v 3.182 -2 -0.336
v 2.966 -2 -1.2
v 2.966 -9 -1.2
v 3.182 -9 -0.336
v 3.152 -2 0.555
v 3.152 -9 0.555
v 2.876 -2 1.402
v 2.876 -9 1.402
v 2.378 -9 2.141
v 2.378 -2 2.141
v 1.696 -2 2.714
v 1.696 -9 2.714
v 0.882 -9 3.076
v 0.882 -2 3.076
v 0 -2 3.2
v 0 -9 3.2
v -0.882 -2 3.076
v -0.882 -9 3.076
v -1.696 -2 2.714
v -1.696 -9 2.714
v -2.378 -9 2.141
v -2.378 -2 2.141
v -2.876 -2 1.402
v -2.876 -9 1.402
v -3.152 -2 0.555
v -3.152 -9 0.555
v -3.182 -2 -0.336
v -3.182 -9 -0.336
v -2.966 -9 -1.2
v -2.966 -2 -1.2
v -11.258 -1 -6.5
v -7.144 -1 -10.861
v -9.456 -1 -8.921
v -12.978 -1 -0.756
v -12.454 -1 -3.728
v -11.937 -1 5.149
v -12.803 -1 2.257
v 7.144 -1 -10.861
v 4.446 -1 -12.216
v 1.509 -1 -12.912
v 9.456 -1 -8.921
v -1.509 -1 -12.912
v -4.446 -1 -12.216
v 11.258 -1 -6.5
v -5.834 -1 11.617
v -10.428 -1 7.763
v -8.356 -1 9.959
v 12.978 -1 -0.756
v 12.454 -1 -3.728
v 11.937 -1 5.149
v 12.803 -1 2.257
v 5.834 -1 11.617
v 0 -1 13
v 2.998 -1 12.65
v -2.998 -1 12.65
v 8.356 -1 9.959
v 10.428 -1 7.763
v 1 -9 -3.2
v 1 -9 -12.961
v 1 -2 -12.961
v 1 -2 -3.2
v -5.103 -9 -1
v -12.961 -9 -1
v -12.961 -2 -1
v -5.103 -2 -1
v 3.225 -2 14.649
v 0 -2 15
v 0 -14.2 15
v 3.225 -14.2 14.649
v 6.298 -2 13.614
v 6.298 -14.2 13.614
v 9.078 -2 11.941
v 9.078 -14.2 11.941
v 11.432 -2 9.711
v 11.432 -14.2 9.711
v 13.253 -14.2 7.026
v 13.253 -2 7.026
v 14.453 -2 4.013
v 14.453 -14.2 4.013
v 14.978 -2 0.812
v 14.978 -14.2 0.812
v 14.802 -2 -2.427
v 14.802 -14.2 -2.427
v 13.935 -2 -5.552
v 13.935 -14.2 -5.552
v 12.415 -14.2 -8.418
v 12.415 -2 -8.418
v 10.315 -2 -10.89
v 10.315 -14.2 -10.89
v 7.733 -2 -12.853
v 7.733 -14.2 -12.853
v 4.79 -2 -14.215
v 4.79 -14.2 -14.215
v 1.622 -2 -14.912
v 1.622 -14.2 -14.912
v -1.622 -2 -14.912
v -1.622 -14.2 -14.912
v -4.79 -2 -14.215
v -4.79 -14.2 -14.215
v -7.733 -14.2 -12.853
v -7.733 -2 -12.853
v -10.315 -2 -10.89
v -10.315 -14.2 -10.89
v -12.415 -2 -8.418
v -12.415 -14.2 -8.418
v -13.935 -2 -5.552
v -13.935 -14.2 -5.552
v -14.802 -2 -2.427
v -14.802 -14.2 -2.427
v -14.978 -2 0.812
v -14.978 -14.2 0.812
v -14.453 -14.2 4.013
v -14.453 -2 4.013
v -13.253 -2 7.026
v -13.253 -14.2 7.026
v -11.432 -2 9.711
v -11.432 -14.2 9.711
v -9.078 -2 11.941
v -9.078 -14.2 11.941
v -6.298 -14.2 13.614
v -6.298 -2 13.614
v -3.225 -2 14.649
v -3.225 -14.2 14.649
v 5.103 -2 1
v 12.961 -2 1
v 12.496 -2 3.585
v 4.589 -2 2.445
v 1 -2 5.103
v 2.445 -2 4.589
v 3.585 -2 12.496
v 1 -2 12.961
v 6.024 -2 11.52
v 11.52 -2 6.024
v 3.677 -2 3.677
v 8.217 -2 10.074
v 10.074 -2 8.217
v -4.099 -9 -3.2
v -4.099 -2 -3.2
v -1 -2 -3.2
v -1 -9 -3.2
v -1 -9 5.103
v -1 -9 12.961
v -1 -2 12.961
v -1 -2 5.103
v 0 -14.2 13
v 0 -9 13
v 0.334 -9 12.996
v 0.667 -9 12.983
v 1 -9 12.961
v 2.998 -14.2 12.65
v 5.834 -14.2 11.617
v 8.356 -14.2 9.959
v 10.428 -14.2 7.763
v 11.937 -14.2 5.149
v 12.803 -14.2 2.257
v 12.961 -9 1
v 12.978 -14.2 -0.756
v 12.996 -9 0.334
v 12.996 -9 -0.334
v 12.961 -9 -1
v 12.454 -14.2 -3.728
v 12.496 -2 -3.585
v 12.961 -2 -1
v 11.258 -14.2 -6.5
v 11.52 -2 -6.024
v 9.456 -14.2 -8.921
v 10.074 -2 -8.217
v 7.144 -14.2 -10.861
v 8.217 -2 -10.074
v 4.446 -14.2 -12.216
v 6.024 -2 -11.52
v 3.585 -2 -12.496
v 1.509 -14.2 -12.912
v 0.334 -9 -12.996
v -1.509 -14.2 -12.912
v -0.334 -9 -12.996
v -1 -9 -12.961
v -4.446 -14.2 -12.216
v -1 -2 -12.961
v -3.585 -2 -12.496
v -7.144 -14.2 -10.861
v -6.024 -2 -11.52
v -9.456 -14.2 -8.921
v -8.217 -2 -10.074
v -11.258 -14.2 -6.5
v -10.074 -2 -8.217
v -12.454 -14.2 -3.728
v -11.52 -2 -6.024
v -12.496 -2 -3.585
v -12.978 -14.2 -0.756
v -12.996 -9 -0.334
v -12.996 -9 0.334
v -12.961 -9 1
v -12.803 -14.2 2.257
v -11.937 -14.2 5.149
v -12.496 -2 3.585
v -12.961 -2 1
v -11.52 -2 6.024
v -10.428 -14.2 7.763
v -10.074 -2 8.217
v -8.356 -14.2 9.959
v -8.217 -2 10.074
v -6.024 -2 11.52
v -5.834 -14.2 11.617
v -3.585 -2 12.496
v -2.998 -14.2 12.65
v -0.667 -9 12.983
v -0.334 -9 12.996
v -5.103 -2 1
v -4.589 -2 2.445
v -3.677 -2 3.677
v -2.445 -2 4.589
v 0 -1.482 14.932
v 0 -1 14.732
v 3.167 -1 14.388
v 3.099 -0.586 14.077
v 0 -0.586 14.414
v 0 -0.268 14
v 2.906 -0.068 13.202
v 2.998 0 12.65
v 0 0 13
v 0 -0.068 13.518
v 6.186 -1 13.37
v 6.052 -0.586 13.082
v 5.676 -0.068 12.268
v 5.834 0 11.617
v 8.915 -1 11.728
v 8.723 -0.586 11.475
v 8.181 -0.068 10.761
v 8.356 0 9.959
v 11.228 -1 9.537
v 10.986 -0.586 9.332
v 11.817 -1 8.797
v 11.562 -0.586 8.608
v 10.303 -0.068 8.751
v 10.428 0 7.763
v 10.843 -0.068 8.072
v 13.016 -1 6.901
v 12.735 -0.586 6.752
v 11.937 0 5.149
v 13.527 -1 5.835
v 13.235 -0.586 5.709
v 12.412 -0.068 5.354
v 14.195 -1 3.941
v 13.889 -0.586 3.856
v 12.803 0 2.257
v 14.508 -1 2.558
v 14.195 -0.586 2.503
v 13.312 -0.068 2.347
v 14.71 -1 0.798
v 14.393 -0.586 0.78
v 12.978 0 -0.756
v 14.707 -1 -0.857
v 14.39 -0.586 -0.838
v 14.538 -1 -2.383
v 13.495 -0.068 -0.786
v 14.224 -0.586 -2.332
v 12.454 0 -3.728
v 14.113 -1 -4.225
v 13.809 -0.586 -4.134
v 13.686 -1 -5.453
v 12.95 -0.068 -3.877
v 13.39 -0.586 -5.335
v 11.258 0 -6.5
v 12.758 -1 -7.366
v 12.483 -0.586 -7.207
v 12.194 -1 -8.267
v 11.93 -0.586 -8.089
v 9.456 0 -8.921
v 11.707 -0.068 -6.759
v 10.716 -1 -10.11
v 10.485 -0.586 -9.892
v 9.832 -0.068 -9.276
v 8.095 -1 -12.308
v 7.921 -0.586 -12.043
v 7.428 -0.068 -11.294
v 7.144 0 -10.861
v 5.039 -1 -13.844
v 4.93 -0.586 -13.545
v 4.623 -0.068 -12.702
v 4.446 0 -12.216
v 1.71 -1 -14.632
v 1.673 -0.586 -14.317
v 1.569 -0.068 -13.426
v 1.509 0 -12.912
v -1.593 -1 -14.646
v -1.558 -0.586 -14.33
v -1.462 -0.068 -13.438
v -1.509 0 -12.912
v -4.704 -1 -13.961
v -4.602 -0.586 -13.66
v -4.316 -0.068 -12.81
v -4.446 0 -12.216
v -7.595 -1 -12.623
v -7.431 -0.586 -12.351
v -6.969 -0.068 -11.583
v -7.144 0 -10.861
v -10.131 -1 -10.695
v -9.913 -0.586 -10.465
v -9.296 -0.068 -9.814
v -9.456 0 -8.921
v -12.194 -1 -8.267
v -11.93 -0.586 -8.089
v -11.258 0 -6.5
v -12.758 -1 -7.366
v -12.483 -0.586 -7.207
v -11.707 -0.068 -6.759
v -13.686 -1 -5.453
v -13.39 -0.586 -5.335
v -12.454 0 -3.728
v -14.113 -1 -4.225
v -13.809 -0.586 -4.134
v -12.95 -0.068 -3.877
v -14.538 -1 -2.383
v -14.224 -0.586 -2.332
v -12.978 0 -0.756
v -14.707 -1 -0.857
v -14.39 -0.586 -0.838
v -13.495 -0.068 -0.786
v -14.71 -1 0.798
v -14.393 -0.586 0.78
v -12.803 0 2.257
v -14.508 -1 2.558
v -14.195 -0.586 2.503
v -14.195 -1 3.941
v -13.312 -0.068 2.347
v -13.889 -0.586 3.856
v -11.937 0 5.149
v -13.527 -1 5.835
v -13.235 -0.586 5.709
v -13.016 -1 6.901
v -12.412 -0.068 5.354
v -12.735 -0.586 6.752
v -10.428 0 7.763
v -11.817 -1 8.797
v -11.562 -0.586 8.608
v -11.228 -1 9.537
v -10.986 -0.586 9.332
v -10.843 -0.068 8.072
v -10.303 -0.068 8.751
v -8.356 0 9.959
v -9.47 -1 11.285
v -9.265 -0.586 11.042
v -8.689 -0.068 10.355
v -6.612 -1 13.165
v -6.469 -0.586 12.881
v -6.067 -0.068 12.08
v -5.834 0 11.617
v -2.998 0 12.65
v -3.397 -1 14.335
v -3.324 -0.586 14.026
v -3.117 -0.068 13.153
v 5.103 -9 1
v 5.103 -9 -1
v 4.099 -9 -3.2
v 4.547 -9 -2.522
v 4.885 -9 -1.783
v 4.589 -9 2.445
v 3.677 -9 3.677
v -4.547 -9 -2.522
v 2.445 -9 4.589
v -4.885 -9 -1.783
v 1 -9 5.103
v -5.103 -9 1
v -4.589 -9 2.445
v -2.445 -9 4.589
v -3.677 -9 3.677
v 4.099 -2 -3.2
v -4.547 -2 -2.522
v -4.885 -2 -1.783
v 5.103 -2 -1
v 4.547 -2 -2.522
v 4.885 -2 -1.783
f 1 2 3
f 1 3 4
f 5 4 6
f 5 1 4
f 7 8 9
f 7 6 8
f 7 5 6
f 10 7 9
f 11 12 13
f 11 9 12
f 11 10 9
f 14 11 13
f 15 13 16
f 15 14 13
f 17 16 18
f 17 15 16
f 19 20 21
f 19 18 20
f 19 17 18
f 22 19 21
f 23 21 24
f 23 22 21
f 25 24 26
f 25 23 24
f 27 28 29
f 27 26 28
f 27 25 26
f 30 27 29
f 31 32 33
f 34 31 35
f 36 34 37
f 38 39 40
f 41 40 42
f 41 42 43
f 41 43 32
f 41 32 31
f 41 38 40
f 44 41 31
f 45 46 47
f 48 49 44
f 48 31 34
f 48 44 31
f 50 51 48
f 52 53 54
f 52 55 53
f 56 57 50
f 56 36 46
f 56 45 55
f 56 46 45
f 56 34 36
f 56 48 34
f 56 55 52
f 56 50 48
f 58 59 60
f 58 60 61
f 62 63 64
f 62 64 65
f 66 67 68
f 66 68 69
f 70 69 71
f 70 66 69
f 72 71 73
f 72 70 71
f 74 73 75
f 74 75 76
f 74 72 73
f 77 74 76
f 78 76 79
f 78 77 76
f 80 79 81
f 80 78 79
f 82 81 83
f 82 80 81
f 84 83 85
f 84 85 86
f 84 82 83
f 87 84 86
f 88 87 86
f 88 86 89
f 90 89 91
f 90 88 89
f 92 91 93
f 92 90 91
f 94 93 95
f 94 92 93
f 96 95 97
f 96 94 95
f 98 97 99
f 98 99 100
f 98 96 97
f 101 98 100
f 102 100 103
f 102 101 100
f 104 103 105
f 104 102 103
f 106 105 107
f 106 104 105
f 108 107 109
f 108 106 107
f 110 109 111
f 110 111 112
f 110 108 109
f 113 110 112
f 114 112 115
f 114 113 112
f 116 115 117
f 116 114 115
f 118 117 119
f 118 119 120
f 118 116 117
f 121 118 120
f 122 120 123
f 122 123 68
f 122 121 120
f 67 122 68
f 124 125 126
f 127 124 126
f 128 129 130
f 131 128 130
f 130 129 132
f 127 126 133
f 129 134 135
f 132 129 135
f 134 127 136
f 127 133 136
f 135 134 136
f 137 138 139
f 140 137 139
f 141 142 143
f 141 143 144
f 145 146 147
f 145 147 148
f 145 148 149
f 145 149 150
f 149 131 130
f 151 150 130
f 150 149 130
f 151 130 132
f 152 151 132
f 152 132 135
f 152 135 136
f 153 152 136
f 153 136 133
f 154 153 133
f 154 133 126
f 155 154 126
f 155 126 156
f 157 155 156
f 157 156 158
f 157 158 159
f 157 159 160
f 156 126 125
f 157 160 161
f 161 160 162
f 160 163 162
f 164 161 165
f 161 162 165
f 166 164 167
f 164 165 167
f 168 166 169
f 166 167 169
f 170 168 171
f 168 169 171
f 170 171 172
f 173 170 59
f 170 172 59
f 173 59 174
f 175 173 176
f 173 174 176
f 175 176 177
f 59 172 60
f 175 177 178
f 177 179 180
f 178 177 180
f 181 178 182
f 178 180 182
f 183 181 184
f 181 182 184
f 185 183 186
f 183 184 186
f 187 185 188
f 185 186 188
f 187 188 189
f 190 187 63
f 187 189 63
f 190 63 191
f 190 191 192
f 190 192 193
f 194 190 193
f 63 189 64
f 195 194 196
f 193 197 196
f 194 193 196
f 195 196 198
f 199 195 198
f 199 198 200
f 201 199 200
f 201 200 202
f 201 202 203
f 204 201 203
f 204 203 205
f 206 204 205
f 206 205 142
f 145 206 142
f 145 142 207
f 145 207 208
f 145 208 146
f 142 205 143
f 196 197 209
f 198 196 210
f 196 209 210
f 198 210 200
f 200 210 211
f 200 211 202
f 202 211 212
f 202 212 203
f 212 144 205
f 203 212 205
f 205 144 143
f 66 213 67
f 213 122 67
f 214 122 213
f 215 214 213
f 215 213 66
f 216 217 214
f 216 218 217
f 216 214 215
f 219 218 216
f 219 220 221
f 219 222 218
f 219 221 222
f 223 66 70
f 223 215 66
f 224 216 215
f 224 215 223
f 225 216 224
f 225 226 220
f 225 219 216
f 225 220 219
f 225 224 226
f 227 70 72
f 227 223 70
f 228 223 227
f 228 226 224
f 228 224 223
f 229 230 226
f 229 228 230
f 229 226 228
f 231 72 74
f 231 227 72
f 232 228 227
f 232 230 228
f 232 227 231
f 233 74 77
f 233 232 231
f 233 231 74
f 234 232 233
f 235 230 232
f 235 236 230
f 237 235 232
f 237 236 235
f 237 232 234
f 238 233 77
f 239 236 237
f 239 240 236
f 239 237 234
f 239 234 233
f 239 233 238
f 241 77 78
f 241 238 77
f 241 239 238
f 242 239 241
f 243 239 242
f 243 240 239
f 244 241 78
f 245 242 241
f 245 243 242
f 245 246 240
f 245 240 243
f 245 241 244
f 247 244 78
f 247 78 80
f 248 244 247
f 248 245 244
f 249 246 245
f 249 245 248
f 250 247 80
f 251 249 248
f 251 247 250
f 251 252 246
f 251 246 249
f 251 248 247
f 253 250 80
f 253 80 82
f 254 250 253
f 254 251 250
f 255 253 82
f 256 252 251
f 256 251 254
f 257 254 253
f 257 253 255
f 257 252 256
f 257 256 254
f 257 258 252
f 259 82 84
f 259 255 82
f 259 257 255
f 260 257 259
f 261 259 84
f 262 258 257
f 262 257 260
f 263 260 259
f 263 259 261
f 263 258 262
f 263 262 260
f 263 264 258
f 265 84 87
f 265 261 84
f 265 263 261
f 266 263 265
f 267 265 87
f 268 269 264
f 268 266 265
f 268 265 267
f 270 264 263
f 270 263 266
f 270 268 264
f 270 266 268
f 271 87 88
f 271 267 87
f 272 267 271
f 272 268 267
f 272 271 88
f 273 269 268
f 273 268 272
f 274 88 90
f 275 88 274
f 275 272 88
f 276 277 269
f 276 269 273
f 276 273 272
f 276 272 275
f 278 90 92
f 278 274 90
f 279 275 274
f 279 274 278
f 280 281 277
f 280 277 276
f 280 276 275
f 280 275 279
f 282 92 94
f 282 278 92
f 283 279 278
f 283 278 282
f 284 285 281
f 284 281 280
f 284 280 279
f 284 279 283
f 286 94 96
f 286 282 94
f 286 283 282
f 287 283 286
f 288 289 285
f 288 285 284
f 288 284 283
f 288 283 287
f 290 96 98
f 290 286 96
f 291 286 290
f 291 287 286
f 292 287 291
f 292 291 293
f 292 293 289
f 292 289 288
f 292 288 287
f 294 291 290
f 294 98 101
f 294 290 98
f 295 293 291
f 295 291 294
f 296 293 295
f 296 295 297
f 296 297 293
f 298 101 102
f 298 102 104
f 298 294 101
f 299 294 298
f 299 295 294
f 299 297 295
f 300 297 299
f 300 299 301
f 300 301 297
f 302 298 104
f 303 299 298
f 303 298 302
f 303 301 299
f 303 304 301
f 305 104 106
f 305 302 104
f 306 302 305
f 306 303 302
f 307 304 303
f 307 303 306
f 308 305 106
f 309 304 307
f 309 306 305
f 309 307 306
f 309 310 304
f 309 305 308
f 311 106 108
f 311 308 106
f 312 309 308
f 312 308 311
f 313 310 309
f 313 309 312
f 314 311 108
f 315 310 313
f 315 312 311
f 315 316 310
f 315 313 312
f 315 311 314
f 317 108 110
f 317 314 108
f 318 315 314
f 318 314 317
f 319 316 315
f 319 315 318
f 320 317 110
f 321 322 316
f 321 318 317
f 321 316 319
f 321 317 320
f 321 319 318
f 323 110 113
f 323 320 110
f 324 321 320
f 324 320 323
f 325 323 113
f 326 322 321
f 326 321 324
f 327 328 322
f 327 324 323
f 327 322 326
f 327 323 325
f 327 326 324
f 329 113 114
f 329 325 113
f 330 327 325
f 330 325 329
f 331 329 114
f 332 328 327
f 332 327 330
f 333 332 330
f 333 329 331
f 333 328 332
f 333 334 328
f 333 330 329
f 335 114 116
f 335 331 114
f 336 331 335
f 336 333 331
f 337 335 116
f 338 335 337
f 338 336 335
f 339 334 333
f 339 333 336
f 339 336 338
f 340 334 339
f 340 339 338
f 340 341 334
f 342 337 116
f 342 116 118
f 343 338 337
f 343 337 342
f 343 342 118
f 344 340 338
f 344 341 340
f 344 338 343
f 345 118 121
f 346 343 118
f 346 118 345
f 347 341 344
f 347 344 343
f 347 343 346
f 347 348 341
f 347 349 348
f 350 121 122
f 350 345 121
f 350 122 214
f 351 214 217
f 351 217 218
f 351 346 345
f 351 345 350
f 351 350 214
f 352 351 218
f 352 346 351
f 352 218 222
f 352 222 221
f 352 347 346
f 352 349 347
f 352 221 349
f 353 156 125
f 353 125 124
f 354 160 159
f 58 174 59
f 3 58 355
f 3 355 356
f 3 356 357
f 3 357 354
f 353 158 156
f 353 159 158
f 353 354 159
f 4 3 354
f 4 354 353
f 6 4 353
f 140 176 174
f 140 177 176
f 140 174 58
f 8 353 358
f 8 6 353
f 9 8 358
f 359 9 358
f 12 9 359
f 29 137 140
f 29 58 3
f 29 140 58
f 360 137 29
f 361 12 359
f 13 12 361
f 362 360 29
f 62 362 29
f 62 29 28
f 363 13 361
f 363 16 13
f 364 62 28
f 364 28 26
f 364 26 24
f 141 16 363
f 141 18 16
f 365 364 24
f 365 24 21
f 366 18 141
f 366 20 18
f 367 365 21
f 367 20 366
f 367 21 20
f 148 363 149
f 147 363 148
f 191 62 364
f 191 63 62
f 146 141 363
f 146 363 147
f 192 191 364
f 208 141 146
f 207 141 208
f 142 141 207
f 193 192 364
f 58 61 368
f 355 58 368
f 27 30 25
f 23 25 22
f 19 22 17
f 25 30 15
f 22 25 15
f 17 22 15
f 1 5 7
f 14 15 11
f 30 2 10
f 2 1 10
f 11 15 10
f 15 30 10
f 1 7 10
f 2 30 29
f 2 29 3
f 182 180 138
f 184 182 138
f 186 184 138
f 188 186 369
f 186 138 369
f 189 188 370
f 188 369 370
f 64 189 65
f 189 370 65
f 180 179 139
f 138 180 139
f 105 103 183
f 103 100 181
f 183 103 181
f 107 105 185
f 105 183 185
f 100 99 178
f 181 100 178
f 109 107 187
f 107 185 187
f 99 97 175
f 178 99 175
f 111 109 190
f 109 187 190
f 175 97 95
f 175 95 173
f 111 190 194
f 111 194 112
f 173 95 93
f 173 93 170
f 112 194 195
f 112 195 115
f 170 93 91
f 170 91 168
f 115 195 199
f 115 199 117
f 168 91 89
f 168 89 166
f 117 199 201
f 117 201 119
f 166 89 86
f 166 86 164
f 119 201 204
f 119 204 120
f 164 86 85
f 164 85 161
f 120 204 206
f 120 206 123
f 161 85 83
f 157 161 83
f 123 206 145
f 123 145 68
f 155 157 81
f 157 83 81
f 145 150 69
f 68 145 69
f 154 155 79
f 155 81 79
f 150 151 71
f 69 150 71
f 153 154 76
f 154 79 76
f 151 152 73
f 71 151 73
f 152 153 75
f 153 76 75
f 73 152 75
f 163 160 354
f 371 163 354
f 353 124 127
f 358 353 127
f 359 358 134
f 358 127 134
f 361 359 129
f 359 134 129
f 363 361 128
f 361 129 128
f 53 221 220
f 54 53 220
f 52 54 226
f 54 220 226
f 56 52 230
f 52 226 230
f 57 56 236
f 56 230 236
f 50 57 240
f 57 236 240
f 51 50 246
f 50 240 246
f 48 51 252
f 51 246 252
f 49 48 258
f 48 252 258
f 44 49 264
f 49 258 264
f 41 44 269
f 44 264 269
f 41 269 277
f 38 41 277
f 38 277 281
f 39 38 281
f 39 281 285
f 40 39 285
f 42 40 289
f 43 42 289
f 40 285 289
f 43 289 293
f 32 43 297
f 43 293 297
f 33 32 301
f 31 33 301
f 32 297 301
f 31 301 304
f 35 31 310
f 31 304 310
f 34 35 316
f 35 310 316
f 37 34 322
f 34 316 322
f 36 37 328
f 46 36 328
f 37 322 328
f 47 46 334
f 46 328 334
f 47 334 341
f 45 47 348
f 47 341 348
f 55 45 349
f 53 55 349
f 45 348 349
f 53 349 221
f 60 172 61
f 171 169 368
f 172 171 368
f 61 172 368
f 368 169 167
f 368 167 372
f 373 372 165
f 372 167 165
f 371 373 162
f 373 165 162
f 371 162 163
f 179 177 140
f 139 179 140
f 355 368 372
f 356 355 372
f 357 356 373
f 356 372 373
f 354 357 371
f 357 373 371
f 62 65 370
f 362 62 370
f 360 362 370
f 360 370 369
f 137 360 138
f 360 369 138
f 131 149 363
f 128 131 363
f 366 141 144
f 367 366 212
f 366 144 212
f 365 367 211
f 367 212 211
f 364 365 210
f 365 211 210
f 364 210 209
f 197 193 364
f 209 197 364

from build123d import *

# Parameters (mm, degrees)
SKETCH1_R           = 15
BOSS_EXTRUDE1_DEPTH = 14.2
SHELL1_T            = -2
EXTRUDE_THIN2_DEPTH = 7
RIB1_REACH          = 25.043
SKETCH3_WALLS_W     = 2
SKETCH3_WALLS_H     = 57.886874488
CIRPATTERN1_COUNT   = 4
FILLET1_R           = 2
SKETCH4_R           = 13
CUT_EXTRUDE1_DEPTH  = 1


with BuildPart() as part:
    # Sketch1 → Boss-Extrude1 (new body)
    with BuildSketch(Plane(origin=(0, 0, 0), x_dir=(1, 0, 0), z_dir=(0, 1, 0))):
        with Locations(Location((0, 0, 0), (0, 0, 270))):
            Circle(SKETCH1_R)
    extrude(amount=-BOSS_EXTRUDE1_DEPTH)

    # Shell1
    shell1_openings = [part.faces().sort_by_distance(p)[0] for p in [
        (0, -14.2, 0),
    ]]
    offset(amount=SHELL1_T, openings=shell1_openings, kind=Kind.INTERSECTION)

    # Sketch2 → Extrude-Thin2 (add)
    with BuildSketch(Plane.XZ.offset(2)):
        with BuildLine():
            Line((-4.098780306, -3.2), (4.098780306, -3.2))
            ThreePointArc((4.098780306, -3.2), (0, 5.2), (-4.098780306, -3.2))
        make_face()
        with BuildLine():
            Line((-2.966479395, -1.2), (2.966479395, -1.2))
            ThreePointArc((2.966479395, -1.2), (0, 3.2), (-2.966479395, -1.2))
        make_face(mode=Mode.SUBTRACT)
    extrude(amount=EXTRUDE_THIN2_DEPTH)

    # Sketch3 walls → Rib1 (add, up to next)
    with BuildSketch(Plane.XZ.offset(9), mode=Mode.PRIVATE) as rib1_sk1:
        with Locations((0, -8.1)):
            Rectangle(SKETCH3_WALLS_W, SKETCH3_WALLS_H)
    rib1_tool1 = extrude(rib1_sk1.sketch, amount=-RIB1_REACH, mode=Mode.PRIVATE) - part.part
    rib1 = rib1_tool1.solids().sort_by_distance((0, -9, -8.1))[0]
    add(rib1)

    # CirPattern1: Rib1 ×4 about axis
    cirpattern1_axis = Axis((0, 0, 0), (0, 1, 0))
    for i in range(1, CIRPATTERN1_COUNT):
        add(rib1.rotate(cirpattern1_axis, i * 360 / CIRPATTERN1_COUNT))

    # Fillet1
    fillet1_edges = [part.edges().sort_by_distance(p)[0] for p in [
        (0, 0, -15),
    ]]
    fillet(fillet1_edges, radius=FILLET1_R)

    # Sketch4 → Cut-Extrude1 (cut)
    with BuildSketch(Plane(origin=(0, 0, 0), x_dir=(1, 0, 0), z_dir=(0, 1, 0))):
        with Locations(Location((0, 0, 0), (0, 0, 270))):
            Circle(SKETCH4_R)
    extrude(amount=-CUT_EXTRUDE1_DEPTH, mode=Mode.SUBTRACT)


solid = part.part
